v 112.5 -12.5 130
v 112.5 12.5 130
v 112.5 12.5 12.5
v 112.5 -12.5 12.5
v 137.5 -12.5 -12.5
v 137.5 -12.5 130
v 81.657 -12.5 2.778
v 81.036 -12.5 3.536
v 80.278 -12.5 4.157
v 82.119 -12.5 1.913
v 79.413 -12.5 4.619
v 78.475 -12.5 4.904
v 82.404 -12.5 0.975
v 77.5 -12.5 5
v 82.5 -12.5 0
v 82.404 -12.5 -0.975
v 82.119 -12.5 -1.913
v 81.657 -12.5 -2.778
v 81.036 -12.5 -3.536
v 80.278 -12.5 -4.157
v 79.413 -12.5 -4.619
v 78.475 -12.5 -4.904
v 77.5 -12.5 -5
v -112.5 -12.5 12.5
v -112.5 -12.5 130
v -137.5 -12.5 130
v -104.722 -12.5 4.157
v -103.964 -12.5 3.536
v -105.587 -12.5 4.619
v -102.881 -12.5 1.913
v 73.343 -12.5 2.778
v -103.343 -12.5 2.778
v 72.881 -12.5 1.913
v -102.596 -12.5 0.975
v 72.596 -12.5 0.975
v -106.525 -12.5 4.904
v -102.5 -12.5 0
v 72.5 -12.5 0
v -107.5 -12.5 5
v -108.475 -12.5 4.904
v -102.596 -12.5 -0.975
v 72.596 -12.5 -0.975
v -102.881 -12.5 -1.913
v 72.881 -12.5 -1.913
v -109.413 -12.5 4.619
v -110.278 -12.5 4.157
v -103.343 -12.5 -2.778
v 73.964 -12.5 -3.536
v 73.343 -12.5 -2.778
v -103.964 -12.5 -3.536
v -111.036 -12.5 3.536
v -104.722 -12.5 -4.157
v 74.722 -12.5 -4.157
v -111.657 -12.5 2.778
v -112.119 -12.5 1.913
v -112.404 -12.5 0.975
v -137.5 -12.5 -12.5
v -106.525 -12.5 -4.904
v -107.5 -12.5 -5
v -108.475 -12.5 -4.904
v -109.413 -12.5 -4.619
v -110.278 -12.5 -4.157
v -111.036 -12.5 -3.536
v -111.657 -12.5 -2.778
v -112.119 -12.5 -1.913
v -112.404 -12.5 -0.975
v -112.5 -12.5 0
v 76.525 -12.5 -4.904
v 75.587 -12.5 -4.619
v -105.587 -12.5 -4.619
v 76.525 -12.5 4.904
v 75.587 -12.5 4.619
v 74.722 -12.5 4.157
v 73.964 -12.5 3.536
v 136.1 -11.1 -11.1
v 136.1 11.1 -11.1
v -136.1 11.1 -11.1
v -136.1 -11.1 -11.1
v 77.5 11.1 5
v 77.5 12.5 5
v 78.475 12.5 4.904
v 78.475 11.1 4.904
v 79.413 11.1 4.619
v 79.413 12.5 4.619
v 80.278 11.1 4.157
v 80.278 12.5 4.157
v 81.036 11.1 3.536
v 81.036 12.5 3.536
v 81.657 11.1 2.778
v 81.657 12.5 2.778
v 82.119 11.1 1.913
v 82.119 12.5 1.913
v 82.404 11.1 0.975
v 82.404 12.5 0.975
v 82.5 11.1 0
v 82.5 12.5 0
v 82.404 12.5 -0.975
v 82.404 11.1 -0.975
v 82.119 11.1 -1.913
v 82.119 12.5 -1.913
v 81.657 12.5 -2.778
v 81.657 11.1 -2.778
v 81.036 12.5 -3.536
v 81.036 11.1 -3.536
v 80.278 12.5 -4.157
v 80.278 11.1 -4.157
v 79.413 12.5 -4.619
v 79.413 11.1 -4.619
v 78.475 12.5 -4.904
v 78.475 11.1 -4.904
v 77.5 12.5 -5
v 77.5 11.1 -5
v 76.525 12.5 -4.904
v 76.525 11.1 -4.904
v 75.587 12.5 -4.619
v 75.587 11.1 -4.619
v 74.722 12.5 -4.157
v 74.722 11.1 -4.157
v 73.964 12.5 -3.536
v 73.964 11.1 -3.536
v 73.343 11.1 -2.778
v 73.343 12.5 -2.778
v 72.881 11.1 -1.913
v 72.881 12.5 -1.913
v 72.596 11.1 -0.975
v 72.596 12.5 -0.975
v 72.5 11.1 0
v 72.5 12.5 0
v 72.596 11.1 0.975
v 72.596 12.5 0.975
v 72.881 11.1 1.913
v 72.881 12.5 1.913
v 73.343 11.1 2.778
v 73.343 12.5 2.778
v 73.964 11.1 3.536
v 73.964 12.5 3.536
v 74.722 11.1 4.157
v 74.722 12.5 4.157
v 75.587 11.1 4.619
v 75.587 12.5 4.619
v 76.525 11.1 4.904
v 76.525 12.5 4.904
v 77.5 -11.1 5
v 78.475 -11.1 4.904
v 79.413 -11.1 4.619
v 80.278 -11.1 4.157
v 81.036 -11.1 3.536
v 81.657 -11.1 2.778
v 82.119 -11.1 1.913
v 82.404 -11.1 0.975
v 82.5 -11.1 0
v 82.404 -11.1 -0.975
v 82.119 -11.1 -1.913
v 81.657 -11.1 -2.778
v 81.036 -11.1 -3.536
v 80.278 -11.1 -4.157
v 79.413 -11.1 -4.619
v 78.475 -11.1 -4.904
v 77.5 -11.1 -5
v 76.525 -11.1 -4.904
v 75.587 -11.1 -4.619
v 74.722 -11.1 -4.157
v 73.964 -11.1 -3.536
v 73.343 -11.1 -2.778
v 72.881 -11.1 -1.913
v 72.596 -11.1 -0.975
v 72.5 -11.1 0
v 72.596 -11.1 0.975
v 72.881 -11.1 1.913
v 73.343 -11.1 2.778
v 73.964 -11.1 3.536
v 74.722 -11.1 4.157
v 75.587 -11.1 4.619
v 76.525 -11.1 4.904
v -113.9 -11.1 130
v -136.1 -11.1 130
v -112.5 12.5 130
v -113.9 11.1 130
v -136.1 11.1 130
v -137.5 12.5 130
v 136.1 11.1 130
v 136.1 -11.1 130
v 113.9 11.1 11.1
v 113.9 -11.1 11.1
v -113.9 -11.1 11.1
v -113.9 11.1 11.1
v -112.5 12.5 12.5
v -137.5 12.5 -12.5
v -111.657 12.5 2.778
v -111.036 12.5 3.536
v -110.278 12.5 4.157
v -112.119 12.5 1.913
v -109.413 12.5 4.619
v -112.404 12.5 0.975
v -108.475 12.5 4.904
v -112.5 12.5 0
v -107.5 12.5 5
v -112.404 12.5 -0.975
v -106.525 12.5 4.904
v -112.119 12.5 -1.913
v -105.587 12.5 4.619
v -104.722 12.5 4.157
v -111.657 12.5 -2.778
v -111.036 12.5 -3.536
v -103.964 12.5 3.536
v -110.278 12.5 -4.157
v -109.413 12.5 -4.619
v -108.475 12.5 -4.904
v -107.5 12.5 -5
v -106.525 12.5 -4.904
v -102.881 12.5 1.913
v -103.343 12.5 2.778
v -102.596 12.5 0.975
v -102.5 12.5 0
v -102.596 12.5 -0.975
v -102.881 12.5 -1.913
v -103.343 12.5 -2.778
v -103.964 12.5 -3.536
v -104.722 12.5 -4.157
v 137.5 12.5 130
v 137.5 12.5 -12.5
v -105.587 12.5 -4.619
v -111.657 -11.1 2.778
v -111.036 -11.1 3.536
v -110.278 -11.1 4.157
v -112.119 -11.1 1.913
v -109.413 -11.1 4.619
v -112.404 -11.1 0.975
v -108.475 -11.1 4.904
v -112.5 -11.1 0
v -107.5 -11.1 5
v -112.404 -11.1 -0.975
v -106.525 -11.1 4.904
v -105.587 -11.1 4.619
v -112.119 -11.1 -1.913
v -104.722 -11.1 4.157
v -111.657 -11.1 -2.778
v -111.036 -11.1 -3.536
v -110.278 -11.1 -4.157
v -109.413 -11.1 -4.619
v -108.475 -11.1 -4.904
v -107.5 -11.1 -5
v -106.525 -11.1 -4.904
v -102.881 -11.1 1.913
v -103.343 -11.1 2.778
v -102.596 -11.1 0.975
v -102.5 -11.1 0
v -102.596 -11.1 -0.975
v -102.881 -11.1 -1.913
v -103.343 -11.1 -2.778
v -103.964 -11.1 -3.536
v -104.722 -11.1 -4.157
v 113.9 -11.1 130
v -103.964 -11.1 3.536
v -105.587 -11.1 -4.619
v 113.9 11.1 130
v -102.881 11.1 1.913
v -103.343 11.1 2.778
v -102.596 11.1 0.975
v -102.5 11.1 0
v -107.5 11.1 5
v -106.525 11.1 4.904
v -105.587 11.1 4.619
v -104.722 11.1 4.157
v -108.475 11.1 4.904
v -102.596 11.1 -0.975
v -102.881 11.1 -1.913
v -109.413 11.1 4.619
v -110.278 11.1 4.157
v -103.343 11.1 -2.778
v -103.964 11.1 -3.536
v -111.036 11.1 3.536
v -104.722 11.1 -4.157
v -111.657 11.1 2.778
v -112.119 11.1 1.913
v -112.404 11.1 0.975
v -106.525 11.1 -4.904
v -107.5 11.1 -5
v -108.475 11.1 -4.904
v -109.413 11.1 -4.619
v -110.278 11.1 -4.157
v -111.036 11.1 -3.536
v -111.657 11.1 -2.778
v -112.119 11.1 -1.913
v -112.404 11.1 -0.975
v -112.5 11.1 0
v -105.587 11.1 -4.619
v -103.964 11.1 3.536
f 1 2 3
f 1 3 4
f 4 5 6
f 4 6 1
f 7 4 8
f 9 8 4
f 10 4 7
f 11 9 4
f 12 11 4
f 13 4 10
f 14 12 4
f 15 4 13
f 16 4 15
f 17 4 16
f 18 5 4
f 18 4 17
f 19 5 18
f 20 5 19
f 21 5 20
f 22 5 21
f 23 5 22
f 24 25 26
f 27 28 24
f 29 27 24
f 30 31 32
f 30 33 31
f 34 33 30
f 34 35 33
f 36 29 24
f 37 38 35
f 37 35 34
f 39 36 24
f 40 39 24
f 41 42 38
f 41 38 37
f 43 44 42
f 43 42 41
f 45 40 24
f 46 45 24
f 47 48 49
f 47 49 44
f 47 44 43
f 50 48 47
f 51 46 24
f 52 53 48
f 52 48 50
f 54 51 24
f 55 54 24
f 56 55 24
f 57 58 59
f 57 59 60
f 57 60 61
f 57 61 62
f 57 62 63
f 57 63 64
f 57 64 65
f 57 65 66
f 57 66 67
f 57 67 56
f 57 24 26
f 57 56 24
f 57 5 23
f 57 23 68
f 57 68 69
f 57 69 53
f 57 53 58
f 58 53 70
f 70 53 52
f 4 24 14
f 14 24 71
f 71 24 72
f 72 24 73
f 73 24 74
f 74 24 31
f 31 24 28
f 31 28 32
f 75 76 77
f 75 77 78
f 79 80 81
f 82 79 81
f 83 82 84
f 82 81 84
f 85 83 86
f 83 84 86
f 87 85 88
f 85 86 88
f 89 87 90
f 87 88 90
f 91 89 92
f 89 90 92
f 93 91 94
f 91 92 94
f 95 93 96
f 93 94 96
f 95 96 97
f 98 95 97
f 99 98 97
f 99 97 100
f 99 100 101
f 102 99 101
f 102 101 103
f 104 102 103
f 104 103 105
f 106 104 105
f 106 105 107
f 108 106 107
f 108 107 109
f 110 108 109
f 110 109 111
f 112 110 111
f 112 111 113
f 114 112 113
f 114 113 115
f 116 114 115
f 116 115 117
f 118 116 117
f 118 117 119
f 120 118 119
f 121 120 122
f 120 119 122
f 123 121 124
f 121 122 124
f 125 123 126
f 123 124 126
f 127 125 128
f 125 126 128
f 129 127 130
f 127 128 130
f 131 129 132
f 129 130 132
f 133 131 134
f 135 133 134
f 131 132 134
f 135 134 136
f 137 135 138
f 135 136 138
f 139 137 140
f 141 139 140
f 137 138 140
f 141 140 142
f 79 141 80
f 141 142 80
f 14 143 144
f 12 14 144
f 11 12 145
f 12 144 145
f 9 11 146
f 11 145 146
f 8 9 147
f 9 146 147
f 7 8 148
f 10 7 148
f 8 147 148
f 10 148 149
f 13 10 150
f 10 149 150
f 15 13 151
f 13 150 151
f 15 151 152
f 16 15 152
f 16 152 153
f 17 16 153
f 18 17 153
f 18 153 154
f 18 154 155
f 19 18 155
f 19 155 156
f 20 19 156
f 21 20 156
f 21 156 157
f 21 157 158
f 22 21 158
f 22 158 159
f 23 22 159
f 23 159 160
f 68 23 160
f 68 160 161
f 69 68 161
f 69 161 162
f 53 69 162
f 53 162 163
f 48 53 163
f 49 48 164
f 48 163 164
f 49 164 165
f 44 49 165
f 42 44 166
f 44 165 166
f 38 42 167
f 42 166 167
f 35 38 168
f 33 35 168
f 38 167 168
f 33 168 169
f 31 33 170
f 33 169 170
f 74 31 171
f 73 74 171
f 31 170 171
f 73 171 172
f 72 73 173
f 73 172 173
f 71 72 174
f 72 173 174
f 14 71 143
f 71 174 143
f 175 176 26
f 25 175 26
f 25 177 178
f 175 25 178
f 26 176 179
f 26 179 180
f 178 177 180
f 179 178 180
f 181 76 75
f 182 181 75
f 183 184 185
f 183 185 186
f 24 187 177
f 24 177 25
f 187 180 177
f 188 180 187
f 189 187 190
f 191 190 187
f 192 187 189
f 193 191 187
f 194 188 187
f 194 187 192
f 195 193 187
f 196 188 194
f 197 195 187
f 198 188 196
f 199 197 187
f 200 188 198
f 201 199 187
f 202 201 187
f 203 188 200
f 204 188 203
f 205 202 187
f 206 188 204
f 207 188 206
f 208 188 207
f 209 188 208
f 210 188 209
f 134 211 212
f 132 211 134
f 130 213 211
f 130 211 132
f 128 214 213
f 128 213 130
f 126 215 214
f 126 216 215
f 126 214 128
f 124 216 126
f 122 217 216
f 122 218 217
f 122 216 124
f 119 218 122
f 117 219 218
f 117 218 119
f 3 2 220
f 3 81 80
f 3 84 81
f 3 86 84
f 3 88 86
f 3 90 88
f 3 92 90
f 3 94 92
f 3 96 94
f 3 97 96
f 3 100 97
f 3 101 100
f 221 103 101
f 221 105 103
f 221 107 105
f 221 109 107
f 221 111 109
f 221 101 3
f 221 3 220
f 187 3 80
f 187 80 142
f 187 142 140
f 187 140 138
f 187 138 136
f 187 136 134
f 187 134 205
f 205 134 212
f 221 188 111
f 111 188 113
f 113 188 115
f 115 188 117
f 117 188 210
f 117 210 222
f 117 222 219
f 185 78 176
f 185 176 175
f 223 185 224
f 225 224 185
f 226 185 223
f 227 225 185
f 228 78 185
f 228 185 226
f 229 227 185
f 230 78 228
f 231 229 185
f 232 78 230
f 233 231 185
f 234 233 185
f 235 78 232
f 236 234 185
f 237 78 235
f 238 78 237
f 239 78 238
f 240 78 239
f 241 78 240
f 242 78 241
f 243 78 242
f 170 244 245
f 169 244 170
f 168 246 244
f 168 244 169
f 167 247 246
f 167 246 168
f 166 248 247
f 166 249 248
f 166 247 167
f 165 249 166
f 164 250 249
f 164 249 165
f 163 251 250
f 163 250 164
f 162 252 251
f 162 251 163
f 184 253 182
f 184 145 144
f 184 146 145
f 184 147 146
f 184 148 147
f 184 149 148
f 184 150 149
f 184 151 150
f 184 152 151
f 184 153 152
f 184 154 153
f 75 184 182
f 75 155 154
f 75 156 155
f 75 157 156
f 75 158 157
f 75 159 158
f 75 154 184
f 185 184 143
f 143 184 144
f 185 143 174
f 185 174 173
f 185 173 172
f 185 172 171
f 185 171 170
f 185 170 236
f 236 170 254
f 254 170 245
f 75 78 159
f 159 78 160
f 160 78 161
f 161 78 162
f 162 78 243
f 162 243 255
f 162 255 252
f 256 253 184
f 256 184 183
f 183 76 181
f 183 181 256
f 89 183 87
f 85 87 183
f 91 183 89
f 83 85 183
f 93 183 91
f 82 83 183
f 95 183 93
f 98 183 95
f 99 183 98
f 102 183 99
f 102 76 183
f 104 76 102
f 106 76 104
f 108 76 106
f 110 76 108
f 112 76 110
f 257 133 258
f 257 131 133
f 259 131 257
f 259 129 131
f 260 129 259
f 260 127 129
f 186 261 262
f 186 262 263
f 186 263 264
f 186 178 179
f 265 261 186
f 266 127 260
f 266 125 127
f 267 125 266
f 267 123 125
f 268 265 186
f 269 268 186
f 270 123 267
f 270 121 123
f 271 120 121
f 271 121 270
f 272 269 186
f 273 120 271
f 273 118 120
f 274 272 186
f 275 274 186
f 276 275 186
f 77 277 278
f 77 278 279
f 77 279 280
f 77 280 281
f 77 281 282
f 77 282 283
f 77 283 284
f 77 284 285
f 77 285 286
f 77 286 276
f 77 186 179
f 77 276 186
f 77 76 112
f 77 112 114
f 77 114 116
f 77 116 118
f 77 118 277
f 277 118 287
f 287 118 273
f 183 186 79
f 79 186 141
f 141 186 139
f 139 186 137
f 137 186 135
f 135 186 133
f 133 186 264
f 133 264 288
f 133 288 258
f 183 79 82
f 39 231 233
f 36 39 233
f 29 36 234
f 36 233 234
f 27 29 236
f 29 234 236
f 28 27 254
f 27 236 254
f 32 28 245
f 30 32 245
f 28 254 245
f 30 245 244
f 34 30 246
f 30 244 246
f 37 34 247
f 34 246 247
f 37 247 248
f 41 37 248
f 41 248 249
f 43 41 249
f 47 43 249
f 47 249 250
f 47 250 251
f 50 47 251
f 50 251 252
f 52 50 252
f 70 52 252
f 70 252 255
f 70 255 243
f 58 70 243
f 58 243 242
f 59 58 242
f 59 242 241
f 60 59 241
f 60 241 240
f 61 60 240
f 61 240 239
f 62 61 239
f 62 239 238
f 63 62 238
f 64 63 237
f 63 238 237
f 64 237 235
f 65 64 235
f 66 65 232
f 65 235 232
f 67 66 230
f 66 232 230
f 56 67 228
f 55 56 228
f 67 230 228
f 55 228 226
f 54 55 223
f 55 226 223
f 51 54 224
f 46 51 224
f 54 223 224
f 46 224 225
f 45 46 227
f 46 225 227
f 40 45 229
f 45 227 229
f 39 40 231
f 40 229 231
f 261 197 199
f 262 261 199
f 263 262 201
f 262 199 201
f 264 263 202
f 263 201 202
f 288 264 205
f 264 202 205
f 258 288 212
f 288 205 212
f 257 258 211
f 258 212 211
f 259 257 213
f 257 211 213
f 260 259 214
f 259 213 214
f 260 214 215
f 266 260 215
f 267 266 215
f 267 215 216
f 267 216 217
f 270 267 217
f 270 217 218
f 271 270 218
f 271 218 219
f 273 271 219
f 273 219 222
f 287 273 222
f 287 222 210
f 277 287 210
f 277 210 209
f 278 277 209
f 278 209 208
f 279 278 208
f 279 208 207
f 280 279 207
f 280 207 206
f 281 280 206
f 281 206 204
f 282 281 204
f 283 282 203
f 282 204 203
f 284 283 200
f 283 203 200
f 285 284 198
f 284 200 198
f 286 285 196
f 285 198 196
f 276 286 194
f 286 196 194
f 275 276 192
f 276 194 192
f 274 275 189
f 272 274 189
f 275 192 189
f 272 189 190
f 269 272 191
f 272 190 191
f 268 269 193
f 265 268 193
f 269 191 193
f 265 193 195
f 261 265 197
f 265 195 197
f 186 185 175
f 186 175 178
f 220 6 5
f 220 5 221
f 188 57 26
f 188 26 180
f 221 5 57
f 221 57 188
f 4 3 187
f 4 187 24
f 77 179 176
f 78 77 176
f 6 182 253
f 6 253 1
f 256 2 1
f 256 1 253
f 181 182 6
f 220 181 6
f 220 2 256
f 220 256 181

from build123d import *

# Parameters (mm, degrees)
SKETCH2_W          = 25
SKETCH2_H          = 25
SKETCH2_W_2        = 22.2
SKETCH2_H_2        = 22.2
CUT_EXTRUDE1_REACH = 192.87
SKETCH3_R          = 5


with BuildPart() as part:
    # Sweep1: sweep along a path in Sketch1
    with BuildLine(Plane(origin=(0, 0, 0), x_dir=(1, 0, 0), z_dir=(0, 1, 0))) as sweep1_path:
        Line((-125, -130), (-125, 0))
        Line((-125, 0), (125, 0))
        Line((125, 0), (125, -130))
    # Sketch2 → Sweep1 (sweep)
    with BuildSketch(Plane(origin=(-125, 0, 130), x_dir=(-1, 0, 0), z_dir=(0, 0, -1))):
        Rectangle(SKETCH2_W, SKETCH2_H)
        Rectangle(SKETCH2_W_2, SKETCH2_H_2, mode=Mode.SUBTRACT)
    sweep(path=sweep1_path.line, transition=Transition.RIGHT)

    # Cut-Extrude1: up to this face of the body (flat: up to its plane)
    cut_extrude1_end = Plane(part.part.faces().sort_by_distance((-115.59727703, -12.5, 71.25))[0])
    # Sketch3 → Cut-Extrude1 (cut, up to the picked face)
    with BuildSketch(Plane(origin=(0, 12.5, 0), x_dir=(1, 0, 0), z_dir=(0, 1, 0)), mode=Mode.PRIVATE) as cut_extrude1_sk1:
        with Locations(Location((77.5, 0, 0), (0, 0, 270))):
            Circle(SKETCH3_R)
    cut_extrude1_tool1 = split(extrude(cut_extrude1_sk1.sketch, amount=-CUT_EXTRUDE1_REACH, mode=Mode.PRIVATE), bisect_by=cut_extrude1_end, keep=Keep.BOTH, mode=Mode.PRIVATE)
    # Sketch3 → Cut-Extrude1 (cut, up to the picked face)
    with BuildSketch(Plane(origin=(0, 12.5, 0), x_dir=(1, 0, 0), z_dir=(0, 1, 0)), mode=Mode.PRIVATE) as cut_extrude1_sk2:
        with Locations(Location((-107.5, 0, 0), (0, 0, 270))):
            Circle(SKETCH3_R)
    cut_extrude1_tool2 = split(extrude(cut_extrude1_sk2.sketch, amount=-CUT_EXTRUDE1_REACH, mode=Mode.PRIVATE), bisect_by=cut_extrude1_end, keep=Keep.BOTH, mode=Mode.PRIVATE)
    add(cut_extrude1_tool1.solids().sort_by(Axis((77.5, 12.5, 0), (0, -1, 0)))[0], mode=Mode.SUBTRACT)
    add(cut_extrude1_tool2.solids().sort_by(Axis((-107.5, 12.5, 0), (0, -1, 0)))[0], mode=Mode.SUBTRACT)


solid = part.part
